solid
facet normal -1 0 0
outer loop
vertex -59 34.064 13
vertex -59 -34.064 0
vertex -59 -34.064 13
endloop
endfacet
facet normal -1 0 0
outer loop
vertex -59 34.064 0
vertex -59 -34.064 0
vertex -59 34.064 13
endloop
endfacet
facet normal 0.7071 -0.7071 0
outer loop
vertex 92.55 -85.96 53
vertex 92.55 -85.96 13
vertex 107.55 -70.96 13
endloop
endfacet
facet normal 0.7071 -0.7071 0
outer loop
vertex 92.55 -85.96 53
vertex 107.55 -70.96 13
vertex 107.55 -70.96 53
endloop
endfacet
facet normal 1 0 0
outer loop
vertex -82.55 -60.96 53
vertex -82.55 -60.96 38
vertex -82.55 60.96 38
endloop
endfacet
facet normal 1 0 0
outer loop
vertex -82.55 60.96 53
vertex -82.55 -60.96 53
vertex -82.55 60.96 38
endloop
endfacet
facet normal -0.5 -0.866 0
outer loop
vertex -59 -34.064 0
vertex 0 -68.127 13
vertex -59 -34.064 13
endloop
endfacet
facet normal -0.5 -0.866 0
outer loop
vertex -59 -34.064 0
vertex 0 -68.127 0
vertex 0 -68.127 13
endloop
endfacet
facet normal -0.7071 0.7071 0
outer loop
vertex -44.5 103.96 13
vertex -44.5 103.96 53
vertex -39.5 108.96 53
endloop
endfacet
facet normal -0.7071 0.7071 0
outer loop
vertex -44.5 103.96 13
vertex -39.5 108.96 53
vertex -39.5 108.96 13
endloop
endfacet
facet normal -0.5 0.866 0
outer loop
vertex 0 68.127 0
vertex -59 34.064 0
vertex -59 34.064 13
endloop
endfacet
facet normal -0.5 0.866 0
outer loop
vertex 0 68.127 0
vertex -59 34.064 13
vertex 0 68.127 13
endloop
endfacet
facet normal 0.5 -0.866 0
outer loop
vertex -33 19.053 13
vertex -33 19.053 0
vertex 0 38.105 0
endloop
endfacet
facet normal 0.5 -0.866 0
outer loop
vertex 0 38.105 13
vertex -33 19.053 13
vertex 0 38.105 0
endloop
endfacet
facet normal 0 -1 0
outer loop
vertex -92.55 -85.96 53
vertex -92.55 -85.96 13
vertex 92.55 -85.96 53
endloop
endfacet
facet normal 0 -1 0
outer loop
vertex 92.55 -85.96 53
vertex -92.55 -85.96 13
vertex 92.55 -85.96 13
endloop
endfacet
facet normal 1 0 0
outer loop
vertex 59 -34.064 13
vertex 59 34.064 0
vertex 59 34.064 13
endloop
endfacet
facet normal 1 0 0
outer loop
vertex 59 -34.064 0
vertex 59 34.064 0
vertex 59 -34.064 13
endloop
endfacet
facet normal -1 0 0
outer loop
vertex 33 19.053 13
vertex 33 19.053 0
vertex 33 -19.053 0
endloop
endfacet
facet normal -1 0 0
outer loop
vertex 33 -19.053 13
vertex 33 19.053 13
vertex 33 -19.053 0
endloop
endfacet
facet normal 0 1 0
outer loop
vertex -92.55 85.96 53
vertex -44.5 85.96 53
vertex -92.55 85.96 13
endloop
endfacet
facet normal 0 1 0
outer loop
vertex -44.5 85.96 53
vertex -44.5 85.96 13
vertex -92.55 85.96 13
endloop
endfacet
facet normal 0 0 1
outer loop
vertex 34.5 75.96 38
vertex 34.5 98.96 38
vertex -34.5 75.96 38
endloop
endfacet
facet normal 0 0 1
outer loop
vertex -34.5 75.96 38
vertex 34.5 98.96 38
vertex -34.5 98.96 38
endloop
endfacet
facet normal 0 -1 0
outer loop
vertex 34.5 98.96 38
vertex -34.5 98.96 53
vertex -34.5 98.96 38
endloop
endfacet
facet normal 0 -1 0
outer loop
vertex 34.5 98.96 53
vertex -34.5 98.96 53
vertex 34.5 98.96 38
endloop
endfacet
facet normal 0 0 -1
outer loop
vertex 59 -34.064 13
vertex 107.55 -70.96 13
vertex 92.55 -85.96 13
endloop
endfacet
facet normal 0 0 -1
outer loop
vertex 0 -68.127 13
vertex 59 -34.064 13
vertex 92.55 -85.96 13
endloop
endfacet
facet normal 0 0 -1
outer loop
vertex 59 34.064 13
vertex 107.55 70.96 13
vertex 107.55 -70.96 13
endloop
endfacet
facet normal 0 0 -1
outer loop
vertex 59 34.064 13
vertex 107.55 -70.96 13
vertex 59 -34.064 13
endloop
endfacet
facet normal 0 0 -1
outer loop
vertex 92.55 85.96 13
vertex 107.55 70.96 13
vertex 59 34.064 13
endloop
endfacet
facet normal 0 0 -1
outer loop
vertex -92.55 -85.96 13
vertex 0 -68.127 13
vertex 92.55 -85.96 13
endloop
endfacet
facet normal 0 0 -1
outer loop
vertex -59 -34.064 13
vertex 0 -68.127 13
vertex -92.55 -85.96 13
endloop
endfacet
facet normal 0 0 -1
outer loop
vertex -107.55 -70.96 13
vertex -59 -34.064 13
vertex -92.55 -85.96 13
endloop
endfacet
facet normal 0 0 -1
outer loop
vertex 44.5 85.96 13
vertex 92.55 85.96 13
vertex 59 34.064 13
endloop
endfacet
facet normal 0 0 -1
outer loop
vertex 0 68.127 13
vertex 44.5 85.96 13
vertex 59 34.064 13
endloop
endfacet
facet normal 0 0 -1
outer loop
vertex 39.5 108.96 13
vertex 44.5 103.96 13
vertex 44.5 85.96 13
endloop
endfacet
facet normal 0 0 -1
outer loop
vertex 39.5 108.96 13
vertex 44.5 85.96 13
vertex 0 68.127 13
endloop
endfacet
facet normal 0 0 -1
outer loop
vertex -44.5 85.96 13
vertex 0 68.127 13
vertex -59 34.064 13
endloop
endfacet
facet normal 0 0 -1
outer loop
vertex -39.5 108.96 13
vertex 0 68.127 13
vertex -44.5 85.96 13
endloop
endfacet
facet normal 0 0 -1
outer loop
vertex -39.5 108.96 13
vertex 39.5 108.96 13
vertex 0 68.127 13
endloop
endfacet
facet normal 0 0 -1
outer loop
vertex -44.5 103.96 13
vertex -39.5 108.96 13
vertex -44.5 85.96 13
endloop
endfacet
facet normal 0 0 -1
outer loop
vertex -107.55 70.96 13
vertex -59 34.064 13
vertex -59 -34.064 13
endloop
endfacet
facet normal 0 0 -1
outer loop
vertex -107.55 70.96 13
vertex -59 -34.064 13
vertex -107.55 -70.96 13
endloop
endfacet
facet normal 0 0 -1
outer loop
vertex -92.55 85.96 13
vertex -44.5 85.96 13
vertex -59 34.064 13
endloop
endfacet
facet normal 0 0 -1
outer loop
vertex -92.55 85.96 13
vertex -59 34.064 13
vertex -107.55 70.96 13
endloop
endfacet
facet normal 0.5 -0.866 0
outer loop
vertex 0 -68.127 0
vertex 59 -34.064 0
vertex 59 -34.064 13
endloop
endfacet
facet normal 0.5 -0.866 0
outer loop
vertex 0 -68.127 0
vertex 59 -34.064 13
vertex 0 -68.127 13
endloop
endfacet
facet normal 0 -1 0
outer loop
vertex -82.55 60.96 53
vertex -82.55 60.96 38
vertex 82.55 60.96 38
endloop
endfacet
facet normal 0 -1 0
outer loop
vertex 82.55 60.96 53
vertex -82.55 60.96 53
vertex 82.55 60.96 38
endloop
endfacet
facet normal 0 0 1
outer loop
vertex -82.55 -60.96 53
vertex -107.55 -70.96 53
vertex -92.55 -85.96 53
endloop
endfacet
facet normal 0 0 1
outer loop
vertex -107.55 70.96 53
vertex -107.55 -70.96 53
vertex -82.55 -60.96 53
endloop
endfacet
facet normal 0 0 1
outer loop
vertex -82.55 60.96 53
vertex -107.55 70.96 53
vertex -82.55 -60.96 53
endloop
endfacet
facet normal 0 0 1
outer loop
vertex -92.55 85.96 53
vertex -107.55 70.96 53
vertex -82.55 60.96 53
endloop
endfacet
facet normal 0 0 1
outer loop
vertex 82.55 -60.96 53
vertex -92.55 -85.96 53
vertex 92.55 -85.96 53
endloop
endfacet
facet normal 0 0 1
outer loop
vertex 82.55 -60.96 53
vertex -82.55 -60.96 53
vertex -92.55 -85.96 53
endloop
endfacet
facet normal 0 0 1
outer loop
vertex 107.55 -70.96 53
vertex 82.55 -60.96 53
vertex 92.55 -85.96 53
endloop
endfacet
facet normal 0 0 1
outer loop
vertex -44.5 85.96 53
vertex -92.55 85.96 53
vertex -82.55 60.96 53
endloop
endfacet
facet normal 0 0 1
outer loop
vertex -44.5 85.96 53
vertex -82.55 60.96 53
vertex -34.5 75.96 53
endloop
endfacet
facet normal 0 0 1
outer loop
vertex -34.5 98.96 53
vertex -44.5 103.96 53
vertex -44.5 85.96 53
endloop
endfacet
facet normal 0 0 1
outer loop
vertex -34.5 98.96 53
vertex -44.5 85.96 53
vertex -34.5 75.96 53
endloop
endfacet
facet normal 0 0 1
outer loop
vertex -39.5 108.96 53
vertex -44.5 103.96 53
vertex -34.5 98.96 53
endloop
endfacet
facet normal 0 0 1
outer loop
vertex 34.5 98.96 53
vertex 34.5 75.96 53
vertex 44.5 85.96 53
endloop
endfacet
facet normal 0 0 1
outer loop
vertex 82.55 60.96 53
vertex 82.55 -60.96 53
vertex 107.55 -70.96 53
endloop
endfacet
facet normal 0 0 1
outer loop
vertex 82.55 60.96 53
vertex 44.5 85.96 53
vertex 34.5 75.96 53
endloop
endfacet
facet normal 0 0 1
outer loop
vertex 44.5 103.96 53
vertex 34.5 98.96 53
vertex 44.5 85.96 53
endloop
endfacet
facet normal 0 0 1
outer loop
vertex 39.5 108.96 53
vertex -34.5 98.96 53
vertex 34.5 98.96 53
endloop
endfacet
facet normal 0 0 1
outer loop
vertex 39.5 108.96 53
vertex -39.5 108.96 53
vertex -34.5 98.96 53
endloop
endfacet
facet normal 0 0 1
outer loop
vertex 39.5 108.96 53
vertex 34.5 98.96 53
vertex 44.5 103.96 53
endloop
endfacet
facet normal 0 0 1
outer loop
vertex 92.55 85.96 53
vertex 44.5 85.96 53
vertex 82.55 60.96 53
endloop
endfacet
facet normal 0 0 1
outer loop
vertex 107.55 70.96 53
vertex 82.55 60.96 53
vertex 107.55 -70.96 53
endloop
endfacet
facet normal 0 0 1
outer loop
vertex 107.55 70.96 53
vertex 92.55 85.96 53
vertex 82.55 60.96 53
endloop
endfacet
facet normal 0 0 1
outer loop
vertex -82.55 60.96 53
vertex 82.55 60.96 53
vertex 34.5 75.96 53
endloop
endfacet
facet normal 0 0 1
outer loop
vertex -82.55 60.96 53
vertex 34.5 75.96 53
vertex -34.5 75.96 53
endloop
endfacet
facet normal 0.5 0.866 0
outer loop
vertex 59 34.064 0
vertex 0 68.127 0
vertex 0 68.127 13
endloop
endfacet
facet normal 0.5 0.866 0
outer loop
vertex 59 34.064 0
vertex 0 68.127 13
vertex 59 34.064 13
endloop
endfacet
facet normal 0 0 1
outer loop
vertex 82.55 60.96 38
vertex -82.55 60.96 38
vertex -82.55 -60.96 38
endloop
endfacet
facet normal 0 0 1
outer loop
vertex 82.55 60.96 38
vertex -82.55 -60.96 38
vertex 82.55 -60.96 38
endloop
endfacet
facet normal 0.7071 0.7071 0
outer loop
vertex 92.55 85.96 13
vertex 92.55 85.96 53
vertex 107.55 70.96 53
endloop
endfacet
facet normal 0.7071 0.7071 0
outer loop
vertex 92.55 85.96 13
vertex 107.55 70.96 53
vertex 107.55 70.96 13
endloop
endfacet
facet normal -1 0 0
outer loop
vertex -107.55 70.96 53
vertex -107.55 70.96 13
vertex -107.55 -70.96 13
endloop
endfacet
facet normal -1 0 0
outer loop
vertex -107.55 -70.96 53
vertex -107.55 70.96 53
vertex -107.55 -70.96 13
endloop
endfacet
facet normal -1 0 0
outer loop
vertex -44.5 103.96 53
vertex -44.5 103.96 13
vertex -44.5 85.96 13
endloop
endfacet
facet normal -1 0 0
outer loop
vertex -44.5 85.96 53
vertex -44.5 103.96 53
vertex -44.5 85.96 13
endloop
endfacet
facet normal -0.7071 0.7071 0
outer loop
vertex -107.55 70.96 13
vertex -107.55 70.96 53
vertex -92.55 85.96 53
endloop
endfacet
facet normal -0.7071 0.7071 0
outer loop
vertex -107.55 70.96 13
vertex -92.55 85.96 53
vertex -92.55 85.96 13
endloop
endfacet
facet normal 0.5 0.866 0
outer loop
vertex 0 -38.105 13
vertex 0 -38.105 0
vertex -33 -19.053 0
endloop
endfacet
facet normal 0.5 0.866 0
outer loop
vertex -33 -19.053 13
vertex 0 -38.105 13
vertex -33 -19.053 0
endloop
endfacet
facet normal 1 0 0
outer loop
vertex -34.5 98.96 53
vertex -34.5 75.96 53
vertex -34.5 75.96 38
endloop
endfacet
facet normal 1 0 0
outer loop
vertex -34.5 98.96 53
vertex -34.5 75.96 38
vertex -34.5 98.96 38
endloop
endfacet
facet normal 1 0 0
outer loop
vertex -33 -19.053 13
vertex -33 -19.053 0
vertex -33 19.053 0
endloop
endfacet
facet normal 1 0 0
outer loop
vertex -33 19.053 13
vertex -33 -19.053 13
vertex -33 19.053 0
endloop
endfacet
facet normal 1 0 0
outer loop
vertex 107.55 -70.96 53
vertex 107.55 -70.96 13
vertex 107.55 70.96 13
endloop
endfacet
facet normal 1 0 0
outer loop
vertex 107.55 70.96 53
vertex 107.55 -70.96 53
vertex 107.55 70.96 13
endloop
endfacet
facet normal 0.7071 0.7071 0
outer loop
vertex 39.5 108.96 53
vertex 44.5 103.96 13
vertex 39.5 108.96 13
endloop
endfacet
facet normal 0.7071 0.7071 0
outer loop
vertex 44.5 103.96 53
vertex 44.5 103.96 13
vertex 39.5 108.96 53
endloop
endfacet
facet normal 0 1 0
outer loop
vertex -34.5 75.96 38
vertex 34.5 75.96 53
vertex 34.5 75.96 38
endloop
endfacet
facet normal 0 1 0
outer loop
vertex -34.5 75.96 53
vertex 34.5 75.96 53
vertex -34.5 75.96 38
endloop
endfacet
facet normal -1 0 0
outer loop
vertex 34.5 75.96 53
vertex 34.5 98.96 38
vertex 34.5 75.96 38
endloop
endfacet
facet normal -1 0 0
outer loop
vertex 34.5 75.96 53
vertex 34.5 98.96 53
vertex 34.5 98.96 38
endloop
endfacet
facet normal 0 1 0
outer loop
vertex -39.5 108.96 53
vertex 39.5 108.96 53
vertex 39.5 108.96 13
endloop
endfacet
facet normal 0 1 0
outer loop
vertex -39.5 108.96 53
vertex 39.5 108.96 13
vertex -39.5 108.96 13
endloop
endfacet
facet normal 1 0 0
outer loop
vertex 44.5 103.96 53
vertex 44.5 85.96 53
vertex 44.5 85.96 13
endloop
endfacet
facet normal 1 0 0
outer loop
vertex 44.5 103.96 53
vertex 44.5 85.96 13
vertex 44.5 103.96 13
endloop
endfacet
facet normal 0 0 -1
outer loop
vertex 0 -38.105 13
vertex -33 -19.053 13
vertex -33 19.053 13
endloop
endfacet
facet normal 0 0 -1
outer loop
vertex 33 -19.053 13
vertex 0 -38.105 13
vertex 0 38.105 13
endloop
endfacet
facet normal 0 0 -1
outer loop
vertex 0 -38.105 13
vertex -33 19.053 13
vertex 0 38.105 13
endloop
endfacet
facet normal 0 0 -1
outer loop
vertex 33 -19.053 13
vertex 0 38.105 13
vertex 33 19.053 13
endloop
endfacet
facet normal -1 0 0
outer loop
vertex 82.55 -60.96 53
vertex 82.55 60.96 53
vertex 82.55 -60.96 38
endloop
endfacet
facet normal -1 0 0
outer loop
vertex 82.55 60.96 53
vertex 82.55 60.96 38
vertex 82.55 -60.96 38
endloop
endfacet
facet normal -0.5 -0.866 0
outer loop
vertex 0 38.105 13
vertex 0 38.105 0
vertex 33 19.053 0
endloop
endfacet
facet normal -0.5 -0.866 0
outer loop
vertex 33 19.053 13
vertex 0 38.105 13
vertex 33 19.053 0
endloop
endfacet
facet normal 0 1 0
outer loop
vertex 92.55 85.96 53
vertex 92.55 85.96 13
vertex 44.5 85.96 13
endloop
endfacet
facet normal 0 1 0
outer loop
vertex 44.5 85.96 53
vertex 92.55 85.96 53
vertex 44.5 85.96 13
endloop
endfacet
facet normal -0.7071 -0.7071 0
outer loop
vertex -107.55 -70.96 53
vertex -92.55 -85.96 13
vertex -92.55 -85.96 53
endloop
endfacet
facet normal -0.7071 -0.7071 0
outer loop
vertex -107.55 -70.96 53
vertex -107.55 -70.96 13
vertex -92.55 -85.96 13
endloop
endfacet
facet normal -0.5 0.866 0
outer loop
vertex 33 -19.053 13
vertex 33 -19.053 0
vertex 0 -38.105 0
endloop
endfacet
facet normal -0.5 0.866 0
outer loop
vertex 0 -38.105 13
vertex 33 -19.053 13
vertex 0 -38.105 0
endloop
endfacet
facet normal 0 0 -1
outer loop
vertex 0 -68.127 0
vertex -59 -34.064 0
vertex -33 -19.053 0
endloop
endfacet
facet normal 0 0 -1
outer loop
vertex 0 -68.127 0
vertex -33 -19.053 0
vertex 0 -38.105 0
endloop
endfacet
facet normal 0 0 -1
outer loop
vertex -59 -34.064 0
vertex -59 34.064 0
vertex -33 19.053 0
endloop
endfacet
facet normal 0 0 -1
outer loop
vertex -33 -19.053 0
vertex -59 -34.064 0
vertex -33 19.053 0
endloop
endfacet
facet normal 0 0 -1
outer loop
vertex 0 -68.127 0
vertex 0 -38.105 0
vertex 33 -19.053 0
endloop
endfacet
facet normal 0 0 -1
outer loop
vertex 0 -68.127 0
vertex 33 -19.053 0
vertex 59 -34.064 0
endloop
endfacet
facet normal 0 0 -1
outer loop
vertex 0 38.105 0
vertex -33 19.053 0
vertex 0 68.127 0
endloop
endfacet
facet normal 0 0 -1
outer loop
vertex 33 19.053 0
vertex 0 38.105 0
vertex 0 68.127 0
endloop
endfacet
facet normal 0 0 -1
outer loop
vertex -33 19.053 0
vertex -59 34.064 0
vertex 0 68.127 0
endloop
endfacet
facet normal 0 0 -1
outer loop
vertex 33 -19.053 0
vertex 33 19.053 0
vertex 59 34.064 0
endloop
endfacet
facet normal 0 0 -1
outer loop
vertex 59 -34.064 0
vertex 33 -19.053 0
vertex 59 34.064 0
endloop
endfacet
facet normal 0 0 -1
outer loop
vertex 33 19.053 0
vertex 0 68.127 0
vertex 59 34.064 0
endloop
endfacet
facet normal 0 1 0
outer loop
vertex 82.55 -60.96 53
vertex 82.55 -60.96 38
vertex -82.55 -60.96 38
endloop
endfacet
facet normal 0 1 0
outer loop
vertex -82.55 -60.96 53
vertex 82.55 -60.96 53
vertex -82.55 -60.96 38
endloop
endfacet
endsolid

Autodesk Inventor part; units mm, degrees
ref_plane "YZ Plane" through (0, 0, 0) normal (1, 0, 0) x (0, 1, 0)
ref_plane "XZ Plane" through (0, 0, 0) normal (0, 1, 0) x (-1, 0, 0)
ref_plane "XY Plane" through (0, 0, 0) normal (0, 0, 1) x (1, 0, 0)
sketch "Sketch1" plane through (0, 0, 0) normal (0, 0, 1) x (1, 0, 0)
  line L0 (33, 19.0526) -> (33, -19.0526)
  line L1 (33, -19.0526) -> (0, -38.1051)
  line L2 (0, -38.1051) -> (-33, -19.0526)
  line L3 (-33, -19.0526) -> (-33, 19.0526)
  line L4 (-33, 19.0526) -> (0, 38.1051)
  line L5 (0, 38.1051) -> (33, 19.0526)
  line L6 (0, 68.1273) -> (59, 34.0637)
  line L7 (59, 34.0637) -> (59, -34.0637)
  line L8 (59, -34.0637) -> (0, -68.1273)
  line L9 (0, -68.1273) -> (-59, -34.0637)
  line L10 (-59, -34.0637) -> (-59, 34.0637)
  line L11 (-59, 34.0637) -> (0, 68.1273)
  point P0 (0, 0)
  point P1 (0, 0)
  point P2 (0, 0)
  dimension "d0" = 66
  dimension "d1" = 118
extrude "Extrusion1" add sketch "Sketch1" along normal blind 13
sketch "Sketch2" plane through (0, 0, 13) normal (0, 0, 1) x (1, 0, 0)
  line L0 (-82.55, 60.96) -> (82.55, 60.96)
  line L1 (82.55, 60.96) -> (82.55, -60.96)
  line L2 (82.55, -60.96) -> (-82.55, -60.96)
  line L3 (-82.55, -60.96) -> (-82.55, 60.96)
  line L4 (107.55, 85.96) -> (-107.55, 85.96)
  line L5 (-107.55, 85.96) -> (-107.55, -85.96)
  line L6 (-107.55, -85.96) -> (107.55, -85.96)
  line L7 (107.55, -85.96) -> (107.55, 85.96)
  point P0 (0, 0)
  point P1 (0, 60.96)
  point P2 (-82.55, 0)
  dimension "d4" = 165.1
  dimension "d5" = 121.92
  dimension "d6" = 25
extrude "Extrusion2" add sketch "Sketch2" along normal blind 40
sketch "Sketch3" plane through (0, 0, 13) normal (0, 0, 1) x (1, 0, 0)
  line L0 (82.55, 60.96) -> (82.55, -60.96) projected
  line L1 (82.55, -60.96) -> (-82.55, -60.96) projected
  line L2 (-82.55, -60.96) -> (-82.55, 60.96) projected
  line L3 (-82.55, 60.96) -> (82.55, 60.96) projected
  line L4 (107.55, 85.96) -> (-107.55, 85.96) projected
  line L5 (-107.55, 85.96) -> (-107.55, -85.96) projected
  line L6 (-107.55, -85.96) -> (107.55, -85.96) projected
  line L7 (107.55, -85.96) -> (107.55, 85.96) projected
  point P0 (0, 0)
extrude "Extrusion3" add sketch "Sketch3" along normal blind 25 contours L0 L1 L2 L3
chamfer "Chamfer1" distance 15 angle 45 4 edges at (107.55, 85.96, 33) (-107.55, 85.96, 33) (-107.55, -85.96, 33) (107.55, -85.96, 33)
sketch "Sketch5" plane through (0, 0, 53) normal (0, 0, 1) x (1, 0, 0)
  line L0 (-34.5, 98.96) -> (34.5, 98.96)
  line L1 (34.5, 98.96) -> (34.5, 75.96)
  line L2 (34.5, 75.96) -> (-34.5, 75.96)
  line L3 (-34.5, 75.96) -> (-34.5, 98.96)
  line L4 (-82.55, 60.96) -> (82.55, 60.96) projected
  line L5 (-44.5, 65.96) -> (44.5, 65.96)
  line L6 (44.5, 65.96) -> (44.5, 108.96)
  line L7 (44.5, 108.96) -> (-44.5, 108.96)
  line L8 (-44.5, 108.96) -> (-44.5, 65.96)
  point P0 (0, 0)
  point P1 (0, 75.96)
  dimension "d16" = 69
  dimension "d17" = 23
  dimension "d18" = 15
  dimension "d19" = 10
extrude "Extrusion5" cut sketch "Sketch5" against normal through all contours L0 L1 L2 L3
extrude "Extrusion6" add sketch "Sketch5" against normal up to surface (40 mm away) from surface at 0
sketch "Sketch6" plane through (0, 0, 13) normal (0, 0, -1) x (-1, 0, 0)
  line L0 (-34.5, 98.96) -> (34.5, 98.96) projected
  line L1 (-34.5, 75.96) -> (-34.5, 98.96) projected
  line L2 (34.5, 98.96) -> (34.5, 75.96) projected
  line L3 (34.5, 75.96) -> (-34.5, 75.96) projected
  point P0 (0, 0)
extrude "Extrusion7" add sketch "Sketch6" against normal blind 25
chamfer "Chamfer2" distance 5 angle 45 2 edges at (-44.5, 108.96, 33) (44.5, 108.96, 33)
sketch "Sketch4" plane through (0, 0, 38) normal (0, 0, 1) x (1, 0, 0)
  arc A0 (-11.0008, -6.7698) -> (-71.9286, -8.4622) centre (-38.141, -127.2687) ccw
  arc A1 (-5.9235, 13.5395) -> (-75.3135, 12.2702) centre (-39.1977, -64.7665) ccw
  line L0 (-71.9286, -8.4622) -> (-75.3135, 12.2702)
  line L1 (-5.9235, 13.5395) -> (-11.0008, -6.7698)
  line L2 (0, 0) -> (0, 51.6194) construction
  arc A2 (71.9286, -8.4622) -> (11.0008, -6.7698) centre (38.141, -127.2687) ccw
  arc A3 (75.3135, 12.2702) -> (5.9235, 13.5395) centre (39.1977, -64.7665) ccw
  line L3 (71.9286, -8.4622) -> (75.3135, 12.2702)
  line L4 (5.9235, 13.5395) -> (11.0008, -6.7698)
  arc A4 (-19.0744, -39.0642) -> (63.8895, -28.5788) centre (-4.9616, 182.7337) ccw
  arc A5 (-20.6474, -45.3561) -> (71.9286, -33.1705) centre (-14.0222, 262.0605) ccw
  line L5 (-20.6474, -45.3561) -> (-19.0744, -39.0642)
  line L6 (63.8895, -28.5788) -> (71.9286, -33.1705)
extrude "Extrusion4" [suppressed]
sketch "Sketch7" plane through (0, 0, 38) normal (0, 0, 1) x (1, 0, 0)
  line L0 (-69.7683, 44.5617) -> (-5.8515, 44.5617)
  line L1 (-5.8515, 44.5617) -> (-5.8515, -27.9073)
  line L2 (-5.8515, -27.9073) -> (-69.7683, -27.9073)
  line L3 (-69.7683, -27.9073) -> (-69.7683, 44.5617)
  line L4 (-5.8515, 8.3272) -> (0, 8.3272)
  line L5 (0, 8.3272) -> (0, 0)
  line L6 (0, 0) -> (-5.8515, 0)
  line L7 (-5.8515, 0) -> (-5.8515, 8.3272)
  line L8 (-82.55, -60.96) -> (-82.55, 60.96) projected
  line L9 (-69.7683, 14.8539) -> (-82.55, 14.8539)
  line L10 (-82.55, 14.8539) -> (-82.55, 4.1636)
  line L11 (-82.55, 4.1636) -> (-69.7683, 4.1636)
  line L12 (-69.7683, 4.1636) -> (-69.7683, 14.8539)
  line L13 (69.7683, 44.5617) -> (5.8515, 44.5617)
  line L14 (5.8515, 44.5617) -> (5.8515, -27.9073)
  line L15 (5.8515, -27.9073) -> (69.7683, -27.9073)
  line L16 (69.7683, -27.9073) -> (69.7683, 44.5617)
  line L17 (5.8515, 8.3272) -> (0, 8.3272)
  line L18 (0, 0) -> (5.8515, 0)
  line L19 (5.8515, 0) -> (5.8515, 8.3272)
  line L20 (82.55, -60.96) -> (82.55, 60.96)
  line L21 (69.7683, 14.8539) -> (82.55, 14.8539)
  line L22 (82.55, 14.8539) -> (82.55, 4.1636)
  line L23 (82.55, 4.1636) -> (69.7683, 4.1636)
  line L24 (69.7683, 4.1636) -> (69.7683, 14.8539)
extrude "Extrusion8" [suppressed]
properties part number "HA11" material "ABS Plastic"
